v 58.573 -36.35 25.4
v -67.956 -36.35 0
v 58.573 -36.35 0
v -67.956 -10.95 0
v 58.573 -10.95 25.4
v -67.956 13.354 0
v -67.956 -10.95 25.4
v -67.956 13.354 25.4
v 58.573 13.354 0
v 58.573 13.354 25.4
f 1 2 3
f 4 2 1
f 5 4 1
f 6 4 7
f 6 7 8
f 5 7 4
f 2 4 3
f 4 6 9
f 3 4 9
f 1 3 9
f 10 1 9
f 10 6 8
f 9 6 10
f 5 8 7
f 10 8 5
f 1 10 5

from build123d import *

# Parameters (mm, degrees)
F0_W     = 126.529091
F0_H     = 49.704478
F1_DEPTH = 25.4
F3_DEPTH = 25.4


with BuildPart() as f1:
    # F0 (on Top) → F1 (new body)
    with BuildSketch(Plane.XY):
        with Locations((-4.691902, -11.49794)):
            Rectangle(F0_W, F0_H)
    extrude(amount=F1_DEPTH)

    # F2 (on face) → F3 (cut)
    with BuildSketch(Plane.XZ.offset(36.350179)):
        Polygon((-67.956448, 0), (58.572643, 25.4), (-67.956448, 25.4), align=None)
    extrude(amount=-F3_DEPTH, mode=Mode.SUBTRACT)


solid = f1.part
